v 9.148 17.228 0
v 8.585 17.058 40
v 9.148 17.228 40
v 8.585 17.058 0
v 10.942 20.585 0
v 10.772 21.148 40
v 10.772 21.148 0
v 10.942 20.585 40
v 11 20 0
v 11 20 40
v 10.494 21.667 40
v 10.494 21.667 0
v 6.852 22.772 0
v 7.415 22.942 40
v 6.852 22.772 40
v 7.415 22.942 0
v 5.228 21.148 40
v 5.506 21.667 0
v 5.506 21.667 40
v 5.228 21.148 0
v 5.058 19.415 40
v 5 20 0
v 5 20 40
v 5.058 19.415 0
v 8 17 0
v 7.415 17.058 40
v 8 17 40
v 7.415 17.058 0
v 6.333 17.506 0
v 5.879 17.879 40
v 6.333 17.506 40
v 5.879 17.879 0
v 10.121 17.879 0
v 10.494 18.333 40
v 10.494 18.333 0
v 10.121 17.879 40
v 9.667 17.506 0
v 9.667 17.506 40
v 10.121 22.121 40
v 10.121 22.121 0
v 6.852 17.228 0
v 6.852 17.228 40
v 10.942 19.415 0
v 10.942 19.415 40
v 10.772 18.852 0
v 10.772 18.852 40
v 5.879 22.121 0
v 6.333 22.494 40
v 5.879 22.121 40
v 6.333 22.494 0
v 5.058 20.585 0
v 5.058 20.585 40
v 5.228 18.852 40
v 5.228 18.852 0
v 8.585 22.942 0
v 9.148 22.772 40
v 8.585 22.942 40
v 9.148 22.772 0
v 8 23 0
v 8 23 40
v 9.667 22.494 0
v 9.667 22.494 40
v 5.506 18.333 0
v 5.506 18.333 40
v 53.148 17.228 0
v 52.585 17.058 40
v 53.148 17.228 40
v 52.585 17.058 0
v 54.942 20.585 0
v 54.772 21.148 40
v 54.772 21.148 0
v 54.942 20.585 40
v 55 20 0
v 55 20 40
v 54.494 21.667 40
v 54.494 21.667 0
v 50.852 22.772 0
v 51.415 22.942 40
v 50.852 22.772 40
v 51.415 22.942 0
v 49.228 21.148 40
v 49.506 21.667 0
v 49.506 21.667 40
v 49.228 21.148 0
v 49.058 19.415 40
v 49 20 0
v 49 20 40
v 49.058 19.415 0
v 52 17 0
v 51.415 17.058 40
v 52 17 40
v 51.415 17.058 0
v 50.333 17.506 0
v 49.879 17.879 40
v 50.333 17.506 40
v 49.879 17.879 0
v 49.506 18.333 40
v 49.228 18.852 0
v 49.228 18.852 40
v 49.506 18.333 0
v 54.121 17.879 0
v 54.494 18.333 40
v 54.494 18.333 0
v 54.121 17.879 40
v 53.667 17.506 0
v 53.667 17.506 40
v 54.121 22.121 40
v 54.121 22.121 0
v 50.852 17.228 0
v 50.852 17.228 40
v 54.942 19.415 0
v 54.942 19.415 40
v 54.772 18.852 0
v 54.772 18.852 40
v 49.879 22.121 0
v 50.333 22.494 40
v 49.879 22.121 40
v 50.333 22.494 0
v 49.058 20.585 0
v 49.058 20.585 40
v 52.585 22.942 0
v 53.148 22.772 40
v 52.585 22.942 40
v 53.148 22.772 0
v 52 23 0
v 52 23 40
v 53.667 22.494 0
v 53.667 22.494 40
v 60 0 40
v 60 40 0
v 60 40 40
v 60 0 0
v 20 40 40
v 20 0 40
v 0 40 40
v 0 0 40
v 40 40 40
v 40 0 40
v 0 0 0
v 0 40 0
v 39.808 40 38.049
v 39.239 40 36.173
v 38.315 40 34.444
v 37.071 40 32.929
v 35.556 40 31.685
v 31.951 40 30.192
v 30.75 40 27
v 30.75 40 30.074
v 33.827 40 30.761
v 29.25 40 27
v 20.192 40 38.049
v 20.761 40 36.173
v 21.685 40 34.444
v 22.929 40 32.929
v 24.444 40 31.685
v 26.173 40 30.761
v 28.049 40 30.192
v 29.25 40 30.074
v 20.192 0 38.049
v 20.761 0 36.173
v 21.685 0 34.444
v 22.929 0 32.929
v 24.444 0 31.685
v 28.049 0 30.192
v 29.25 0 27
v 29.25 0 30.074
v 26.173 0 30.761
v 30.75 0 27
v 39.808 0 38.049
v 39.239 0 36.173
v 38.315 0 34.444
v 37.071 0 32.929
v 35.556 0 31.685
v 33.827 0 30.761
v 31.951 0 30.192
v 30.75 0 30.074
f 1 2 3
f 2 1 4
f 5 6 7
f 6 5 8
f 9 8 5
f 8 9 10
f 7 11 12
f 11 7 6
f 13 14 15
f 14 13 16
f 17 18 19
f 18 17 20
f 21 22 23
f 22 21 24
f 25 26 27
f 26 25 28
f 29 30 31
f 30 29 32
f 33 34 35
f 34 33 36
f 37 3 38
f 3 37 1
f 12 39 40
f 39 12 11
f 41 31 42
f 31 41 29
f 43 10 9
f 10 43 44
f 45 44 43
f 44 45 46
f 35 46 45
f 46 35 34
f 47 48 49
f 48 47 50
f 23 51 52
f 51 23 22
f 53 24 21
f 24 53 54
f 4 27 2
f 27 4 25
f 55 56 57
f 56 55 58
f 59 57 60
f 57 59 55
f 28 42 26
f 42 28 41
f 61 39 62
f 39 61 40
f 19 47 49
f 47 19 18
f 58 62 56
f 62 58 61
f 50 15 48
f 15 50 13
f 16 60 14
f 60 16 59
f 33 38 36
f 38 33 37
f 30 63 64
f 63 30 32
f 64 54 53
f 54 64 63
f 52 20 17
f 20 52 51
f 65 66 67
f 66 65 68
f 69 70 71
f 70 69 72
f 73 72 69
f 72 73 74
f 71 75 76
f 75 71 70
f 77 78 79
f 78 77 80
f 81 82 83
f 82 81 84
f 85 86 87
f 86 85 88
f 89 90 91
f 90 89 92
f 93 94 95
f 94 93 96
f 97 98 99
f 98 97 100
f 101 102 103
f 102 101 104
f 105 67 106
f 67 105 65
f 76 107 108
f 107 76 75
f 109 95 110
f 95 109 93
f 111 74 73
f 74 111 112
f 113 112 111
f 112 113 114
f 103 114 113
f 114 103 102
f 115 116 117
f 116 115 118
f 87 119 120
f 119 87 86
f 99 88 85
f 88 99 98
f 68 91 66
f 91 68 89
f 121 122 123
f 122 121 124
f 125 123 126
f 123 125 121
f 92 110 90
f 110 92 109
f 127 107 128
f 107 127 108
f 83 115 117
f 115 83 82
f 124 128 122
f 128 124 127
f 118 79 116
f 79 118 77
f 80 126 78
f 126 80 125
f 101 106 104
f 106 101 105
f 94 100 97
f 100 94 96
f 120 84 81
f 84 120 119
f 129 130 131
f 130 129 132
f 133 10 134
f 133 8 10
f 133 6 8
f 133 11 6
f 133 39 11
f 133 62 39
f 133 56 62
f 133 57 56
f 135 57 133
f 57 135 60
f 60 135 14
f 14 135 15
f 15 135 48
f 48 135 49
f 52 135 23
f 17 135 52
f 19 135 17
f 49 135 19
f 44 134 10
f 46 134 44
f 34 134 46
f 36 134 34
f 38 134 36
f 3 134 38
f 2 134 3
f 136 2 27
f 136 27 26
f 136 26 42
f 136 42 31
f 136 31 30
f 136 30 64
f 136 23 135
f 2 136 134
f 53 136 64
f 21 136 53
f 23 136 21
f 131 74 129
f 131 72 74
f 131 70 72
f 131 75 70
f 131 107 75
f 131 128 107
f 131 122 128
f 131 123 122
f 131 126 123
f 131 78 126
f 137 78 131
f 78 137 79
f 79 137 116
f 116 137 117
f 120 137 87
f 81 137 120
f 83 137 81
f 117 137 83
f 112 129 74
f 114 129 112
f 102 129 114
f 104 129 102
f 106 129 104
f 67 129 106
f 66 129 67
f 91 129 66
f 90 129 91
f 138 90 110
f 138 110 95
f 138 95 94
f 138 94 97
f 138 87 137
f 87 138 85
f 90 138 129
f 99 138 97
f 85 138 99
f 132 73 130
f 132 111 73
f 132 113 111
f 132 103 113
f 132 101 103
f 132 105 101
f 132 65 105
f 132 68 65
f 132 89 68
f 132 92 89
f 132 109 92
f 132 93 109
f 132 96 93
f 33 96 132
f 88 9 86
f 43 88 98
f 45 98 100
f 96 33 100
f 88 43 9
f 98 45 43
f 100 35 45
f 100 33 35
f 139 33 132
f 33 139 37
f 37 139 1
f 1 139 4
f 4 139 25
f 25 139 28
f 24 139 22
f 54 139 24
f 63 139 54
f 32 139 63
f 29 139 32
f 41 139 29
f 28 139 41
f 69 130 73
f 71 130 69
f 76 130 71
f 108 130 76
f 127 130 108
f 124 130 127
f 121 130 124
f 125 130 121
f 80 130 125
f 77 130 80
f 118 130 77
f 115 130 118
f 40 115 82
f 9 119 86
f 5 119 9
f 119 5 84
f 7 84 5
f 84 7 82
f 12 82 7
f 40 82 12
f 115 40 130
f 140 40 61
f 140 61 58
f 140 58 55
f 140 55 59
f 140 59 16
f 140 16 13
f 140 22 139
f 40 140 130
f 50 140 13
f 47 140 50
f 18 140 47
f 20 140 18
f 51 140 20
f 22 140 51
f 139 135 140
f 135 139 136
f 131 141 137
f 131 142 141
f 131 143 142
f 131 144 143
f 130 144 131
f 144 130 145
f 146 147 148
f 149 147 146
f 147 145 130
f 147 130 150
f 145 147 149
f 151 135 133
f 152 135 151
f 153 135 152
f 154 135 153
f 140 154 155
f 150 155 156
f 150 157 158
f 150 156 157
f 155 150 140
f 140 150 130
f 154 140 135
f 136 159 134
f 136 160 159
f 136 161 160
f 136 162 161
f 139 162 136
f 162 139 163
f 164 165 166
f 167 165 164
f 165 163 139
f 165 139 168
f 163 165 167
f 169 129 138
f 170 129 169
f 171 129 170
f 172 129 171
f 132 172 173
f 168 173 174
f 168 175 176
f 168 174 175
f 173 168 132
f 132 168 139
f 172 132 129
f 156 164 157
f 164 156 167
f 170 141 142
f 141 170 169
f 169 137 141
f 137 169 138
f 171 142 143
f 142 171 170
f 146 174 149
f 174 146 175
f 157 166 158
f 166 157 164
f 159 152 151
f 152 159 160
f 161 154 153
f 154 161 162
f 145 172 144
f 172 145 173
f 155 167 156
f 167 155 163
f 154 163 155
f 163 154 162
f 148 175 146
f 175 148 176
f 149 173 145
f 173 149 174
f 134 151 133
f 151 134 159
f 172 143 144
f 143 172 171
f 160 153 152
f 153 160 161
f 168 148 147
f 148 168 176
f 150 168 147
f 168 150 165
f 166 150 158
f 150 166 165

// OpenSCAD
$fn = 32;

// ----------------------------------------------------------------------
// Saddle clamp: split shaft clamp
// ----------------------------------------------------------------------

// --- parameters (mm) ---
blk_l = 60;               // block length, X
blk_w = 40;               // block width, Y
blk_h = 40;               // block height
clamp_r = 10;             // shaft groove radius
hole_r = 3;               // bolt hole radius
hole_m = 8;               // bolt hole margin from the ends
saw_w = 1.5;              // saw kerf width

saw_depth = clamp_r + 3;  // saw kerf depth

difference() {
  cube([blk_l, blk_w, blk_h]);
  translate([blk_l / 2, -1, blk_h])
    rotate([-90, 0, 0])
      cylinder(h = blk_w + 2, r = clamp_r);
  for (sx = [0, 1])
    translate([sx ? blk_l - hole_m : hole_m, blk_w / 2, -1])
      cylinder(r = hole_r, h = blk_h + 2);
  translate([blk_l / 2 - saw_w / 2, -1, blk_h - saw_depth])
    cube([saw_w, blk_w + 2, saw_depth + 1]);
}
